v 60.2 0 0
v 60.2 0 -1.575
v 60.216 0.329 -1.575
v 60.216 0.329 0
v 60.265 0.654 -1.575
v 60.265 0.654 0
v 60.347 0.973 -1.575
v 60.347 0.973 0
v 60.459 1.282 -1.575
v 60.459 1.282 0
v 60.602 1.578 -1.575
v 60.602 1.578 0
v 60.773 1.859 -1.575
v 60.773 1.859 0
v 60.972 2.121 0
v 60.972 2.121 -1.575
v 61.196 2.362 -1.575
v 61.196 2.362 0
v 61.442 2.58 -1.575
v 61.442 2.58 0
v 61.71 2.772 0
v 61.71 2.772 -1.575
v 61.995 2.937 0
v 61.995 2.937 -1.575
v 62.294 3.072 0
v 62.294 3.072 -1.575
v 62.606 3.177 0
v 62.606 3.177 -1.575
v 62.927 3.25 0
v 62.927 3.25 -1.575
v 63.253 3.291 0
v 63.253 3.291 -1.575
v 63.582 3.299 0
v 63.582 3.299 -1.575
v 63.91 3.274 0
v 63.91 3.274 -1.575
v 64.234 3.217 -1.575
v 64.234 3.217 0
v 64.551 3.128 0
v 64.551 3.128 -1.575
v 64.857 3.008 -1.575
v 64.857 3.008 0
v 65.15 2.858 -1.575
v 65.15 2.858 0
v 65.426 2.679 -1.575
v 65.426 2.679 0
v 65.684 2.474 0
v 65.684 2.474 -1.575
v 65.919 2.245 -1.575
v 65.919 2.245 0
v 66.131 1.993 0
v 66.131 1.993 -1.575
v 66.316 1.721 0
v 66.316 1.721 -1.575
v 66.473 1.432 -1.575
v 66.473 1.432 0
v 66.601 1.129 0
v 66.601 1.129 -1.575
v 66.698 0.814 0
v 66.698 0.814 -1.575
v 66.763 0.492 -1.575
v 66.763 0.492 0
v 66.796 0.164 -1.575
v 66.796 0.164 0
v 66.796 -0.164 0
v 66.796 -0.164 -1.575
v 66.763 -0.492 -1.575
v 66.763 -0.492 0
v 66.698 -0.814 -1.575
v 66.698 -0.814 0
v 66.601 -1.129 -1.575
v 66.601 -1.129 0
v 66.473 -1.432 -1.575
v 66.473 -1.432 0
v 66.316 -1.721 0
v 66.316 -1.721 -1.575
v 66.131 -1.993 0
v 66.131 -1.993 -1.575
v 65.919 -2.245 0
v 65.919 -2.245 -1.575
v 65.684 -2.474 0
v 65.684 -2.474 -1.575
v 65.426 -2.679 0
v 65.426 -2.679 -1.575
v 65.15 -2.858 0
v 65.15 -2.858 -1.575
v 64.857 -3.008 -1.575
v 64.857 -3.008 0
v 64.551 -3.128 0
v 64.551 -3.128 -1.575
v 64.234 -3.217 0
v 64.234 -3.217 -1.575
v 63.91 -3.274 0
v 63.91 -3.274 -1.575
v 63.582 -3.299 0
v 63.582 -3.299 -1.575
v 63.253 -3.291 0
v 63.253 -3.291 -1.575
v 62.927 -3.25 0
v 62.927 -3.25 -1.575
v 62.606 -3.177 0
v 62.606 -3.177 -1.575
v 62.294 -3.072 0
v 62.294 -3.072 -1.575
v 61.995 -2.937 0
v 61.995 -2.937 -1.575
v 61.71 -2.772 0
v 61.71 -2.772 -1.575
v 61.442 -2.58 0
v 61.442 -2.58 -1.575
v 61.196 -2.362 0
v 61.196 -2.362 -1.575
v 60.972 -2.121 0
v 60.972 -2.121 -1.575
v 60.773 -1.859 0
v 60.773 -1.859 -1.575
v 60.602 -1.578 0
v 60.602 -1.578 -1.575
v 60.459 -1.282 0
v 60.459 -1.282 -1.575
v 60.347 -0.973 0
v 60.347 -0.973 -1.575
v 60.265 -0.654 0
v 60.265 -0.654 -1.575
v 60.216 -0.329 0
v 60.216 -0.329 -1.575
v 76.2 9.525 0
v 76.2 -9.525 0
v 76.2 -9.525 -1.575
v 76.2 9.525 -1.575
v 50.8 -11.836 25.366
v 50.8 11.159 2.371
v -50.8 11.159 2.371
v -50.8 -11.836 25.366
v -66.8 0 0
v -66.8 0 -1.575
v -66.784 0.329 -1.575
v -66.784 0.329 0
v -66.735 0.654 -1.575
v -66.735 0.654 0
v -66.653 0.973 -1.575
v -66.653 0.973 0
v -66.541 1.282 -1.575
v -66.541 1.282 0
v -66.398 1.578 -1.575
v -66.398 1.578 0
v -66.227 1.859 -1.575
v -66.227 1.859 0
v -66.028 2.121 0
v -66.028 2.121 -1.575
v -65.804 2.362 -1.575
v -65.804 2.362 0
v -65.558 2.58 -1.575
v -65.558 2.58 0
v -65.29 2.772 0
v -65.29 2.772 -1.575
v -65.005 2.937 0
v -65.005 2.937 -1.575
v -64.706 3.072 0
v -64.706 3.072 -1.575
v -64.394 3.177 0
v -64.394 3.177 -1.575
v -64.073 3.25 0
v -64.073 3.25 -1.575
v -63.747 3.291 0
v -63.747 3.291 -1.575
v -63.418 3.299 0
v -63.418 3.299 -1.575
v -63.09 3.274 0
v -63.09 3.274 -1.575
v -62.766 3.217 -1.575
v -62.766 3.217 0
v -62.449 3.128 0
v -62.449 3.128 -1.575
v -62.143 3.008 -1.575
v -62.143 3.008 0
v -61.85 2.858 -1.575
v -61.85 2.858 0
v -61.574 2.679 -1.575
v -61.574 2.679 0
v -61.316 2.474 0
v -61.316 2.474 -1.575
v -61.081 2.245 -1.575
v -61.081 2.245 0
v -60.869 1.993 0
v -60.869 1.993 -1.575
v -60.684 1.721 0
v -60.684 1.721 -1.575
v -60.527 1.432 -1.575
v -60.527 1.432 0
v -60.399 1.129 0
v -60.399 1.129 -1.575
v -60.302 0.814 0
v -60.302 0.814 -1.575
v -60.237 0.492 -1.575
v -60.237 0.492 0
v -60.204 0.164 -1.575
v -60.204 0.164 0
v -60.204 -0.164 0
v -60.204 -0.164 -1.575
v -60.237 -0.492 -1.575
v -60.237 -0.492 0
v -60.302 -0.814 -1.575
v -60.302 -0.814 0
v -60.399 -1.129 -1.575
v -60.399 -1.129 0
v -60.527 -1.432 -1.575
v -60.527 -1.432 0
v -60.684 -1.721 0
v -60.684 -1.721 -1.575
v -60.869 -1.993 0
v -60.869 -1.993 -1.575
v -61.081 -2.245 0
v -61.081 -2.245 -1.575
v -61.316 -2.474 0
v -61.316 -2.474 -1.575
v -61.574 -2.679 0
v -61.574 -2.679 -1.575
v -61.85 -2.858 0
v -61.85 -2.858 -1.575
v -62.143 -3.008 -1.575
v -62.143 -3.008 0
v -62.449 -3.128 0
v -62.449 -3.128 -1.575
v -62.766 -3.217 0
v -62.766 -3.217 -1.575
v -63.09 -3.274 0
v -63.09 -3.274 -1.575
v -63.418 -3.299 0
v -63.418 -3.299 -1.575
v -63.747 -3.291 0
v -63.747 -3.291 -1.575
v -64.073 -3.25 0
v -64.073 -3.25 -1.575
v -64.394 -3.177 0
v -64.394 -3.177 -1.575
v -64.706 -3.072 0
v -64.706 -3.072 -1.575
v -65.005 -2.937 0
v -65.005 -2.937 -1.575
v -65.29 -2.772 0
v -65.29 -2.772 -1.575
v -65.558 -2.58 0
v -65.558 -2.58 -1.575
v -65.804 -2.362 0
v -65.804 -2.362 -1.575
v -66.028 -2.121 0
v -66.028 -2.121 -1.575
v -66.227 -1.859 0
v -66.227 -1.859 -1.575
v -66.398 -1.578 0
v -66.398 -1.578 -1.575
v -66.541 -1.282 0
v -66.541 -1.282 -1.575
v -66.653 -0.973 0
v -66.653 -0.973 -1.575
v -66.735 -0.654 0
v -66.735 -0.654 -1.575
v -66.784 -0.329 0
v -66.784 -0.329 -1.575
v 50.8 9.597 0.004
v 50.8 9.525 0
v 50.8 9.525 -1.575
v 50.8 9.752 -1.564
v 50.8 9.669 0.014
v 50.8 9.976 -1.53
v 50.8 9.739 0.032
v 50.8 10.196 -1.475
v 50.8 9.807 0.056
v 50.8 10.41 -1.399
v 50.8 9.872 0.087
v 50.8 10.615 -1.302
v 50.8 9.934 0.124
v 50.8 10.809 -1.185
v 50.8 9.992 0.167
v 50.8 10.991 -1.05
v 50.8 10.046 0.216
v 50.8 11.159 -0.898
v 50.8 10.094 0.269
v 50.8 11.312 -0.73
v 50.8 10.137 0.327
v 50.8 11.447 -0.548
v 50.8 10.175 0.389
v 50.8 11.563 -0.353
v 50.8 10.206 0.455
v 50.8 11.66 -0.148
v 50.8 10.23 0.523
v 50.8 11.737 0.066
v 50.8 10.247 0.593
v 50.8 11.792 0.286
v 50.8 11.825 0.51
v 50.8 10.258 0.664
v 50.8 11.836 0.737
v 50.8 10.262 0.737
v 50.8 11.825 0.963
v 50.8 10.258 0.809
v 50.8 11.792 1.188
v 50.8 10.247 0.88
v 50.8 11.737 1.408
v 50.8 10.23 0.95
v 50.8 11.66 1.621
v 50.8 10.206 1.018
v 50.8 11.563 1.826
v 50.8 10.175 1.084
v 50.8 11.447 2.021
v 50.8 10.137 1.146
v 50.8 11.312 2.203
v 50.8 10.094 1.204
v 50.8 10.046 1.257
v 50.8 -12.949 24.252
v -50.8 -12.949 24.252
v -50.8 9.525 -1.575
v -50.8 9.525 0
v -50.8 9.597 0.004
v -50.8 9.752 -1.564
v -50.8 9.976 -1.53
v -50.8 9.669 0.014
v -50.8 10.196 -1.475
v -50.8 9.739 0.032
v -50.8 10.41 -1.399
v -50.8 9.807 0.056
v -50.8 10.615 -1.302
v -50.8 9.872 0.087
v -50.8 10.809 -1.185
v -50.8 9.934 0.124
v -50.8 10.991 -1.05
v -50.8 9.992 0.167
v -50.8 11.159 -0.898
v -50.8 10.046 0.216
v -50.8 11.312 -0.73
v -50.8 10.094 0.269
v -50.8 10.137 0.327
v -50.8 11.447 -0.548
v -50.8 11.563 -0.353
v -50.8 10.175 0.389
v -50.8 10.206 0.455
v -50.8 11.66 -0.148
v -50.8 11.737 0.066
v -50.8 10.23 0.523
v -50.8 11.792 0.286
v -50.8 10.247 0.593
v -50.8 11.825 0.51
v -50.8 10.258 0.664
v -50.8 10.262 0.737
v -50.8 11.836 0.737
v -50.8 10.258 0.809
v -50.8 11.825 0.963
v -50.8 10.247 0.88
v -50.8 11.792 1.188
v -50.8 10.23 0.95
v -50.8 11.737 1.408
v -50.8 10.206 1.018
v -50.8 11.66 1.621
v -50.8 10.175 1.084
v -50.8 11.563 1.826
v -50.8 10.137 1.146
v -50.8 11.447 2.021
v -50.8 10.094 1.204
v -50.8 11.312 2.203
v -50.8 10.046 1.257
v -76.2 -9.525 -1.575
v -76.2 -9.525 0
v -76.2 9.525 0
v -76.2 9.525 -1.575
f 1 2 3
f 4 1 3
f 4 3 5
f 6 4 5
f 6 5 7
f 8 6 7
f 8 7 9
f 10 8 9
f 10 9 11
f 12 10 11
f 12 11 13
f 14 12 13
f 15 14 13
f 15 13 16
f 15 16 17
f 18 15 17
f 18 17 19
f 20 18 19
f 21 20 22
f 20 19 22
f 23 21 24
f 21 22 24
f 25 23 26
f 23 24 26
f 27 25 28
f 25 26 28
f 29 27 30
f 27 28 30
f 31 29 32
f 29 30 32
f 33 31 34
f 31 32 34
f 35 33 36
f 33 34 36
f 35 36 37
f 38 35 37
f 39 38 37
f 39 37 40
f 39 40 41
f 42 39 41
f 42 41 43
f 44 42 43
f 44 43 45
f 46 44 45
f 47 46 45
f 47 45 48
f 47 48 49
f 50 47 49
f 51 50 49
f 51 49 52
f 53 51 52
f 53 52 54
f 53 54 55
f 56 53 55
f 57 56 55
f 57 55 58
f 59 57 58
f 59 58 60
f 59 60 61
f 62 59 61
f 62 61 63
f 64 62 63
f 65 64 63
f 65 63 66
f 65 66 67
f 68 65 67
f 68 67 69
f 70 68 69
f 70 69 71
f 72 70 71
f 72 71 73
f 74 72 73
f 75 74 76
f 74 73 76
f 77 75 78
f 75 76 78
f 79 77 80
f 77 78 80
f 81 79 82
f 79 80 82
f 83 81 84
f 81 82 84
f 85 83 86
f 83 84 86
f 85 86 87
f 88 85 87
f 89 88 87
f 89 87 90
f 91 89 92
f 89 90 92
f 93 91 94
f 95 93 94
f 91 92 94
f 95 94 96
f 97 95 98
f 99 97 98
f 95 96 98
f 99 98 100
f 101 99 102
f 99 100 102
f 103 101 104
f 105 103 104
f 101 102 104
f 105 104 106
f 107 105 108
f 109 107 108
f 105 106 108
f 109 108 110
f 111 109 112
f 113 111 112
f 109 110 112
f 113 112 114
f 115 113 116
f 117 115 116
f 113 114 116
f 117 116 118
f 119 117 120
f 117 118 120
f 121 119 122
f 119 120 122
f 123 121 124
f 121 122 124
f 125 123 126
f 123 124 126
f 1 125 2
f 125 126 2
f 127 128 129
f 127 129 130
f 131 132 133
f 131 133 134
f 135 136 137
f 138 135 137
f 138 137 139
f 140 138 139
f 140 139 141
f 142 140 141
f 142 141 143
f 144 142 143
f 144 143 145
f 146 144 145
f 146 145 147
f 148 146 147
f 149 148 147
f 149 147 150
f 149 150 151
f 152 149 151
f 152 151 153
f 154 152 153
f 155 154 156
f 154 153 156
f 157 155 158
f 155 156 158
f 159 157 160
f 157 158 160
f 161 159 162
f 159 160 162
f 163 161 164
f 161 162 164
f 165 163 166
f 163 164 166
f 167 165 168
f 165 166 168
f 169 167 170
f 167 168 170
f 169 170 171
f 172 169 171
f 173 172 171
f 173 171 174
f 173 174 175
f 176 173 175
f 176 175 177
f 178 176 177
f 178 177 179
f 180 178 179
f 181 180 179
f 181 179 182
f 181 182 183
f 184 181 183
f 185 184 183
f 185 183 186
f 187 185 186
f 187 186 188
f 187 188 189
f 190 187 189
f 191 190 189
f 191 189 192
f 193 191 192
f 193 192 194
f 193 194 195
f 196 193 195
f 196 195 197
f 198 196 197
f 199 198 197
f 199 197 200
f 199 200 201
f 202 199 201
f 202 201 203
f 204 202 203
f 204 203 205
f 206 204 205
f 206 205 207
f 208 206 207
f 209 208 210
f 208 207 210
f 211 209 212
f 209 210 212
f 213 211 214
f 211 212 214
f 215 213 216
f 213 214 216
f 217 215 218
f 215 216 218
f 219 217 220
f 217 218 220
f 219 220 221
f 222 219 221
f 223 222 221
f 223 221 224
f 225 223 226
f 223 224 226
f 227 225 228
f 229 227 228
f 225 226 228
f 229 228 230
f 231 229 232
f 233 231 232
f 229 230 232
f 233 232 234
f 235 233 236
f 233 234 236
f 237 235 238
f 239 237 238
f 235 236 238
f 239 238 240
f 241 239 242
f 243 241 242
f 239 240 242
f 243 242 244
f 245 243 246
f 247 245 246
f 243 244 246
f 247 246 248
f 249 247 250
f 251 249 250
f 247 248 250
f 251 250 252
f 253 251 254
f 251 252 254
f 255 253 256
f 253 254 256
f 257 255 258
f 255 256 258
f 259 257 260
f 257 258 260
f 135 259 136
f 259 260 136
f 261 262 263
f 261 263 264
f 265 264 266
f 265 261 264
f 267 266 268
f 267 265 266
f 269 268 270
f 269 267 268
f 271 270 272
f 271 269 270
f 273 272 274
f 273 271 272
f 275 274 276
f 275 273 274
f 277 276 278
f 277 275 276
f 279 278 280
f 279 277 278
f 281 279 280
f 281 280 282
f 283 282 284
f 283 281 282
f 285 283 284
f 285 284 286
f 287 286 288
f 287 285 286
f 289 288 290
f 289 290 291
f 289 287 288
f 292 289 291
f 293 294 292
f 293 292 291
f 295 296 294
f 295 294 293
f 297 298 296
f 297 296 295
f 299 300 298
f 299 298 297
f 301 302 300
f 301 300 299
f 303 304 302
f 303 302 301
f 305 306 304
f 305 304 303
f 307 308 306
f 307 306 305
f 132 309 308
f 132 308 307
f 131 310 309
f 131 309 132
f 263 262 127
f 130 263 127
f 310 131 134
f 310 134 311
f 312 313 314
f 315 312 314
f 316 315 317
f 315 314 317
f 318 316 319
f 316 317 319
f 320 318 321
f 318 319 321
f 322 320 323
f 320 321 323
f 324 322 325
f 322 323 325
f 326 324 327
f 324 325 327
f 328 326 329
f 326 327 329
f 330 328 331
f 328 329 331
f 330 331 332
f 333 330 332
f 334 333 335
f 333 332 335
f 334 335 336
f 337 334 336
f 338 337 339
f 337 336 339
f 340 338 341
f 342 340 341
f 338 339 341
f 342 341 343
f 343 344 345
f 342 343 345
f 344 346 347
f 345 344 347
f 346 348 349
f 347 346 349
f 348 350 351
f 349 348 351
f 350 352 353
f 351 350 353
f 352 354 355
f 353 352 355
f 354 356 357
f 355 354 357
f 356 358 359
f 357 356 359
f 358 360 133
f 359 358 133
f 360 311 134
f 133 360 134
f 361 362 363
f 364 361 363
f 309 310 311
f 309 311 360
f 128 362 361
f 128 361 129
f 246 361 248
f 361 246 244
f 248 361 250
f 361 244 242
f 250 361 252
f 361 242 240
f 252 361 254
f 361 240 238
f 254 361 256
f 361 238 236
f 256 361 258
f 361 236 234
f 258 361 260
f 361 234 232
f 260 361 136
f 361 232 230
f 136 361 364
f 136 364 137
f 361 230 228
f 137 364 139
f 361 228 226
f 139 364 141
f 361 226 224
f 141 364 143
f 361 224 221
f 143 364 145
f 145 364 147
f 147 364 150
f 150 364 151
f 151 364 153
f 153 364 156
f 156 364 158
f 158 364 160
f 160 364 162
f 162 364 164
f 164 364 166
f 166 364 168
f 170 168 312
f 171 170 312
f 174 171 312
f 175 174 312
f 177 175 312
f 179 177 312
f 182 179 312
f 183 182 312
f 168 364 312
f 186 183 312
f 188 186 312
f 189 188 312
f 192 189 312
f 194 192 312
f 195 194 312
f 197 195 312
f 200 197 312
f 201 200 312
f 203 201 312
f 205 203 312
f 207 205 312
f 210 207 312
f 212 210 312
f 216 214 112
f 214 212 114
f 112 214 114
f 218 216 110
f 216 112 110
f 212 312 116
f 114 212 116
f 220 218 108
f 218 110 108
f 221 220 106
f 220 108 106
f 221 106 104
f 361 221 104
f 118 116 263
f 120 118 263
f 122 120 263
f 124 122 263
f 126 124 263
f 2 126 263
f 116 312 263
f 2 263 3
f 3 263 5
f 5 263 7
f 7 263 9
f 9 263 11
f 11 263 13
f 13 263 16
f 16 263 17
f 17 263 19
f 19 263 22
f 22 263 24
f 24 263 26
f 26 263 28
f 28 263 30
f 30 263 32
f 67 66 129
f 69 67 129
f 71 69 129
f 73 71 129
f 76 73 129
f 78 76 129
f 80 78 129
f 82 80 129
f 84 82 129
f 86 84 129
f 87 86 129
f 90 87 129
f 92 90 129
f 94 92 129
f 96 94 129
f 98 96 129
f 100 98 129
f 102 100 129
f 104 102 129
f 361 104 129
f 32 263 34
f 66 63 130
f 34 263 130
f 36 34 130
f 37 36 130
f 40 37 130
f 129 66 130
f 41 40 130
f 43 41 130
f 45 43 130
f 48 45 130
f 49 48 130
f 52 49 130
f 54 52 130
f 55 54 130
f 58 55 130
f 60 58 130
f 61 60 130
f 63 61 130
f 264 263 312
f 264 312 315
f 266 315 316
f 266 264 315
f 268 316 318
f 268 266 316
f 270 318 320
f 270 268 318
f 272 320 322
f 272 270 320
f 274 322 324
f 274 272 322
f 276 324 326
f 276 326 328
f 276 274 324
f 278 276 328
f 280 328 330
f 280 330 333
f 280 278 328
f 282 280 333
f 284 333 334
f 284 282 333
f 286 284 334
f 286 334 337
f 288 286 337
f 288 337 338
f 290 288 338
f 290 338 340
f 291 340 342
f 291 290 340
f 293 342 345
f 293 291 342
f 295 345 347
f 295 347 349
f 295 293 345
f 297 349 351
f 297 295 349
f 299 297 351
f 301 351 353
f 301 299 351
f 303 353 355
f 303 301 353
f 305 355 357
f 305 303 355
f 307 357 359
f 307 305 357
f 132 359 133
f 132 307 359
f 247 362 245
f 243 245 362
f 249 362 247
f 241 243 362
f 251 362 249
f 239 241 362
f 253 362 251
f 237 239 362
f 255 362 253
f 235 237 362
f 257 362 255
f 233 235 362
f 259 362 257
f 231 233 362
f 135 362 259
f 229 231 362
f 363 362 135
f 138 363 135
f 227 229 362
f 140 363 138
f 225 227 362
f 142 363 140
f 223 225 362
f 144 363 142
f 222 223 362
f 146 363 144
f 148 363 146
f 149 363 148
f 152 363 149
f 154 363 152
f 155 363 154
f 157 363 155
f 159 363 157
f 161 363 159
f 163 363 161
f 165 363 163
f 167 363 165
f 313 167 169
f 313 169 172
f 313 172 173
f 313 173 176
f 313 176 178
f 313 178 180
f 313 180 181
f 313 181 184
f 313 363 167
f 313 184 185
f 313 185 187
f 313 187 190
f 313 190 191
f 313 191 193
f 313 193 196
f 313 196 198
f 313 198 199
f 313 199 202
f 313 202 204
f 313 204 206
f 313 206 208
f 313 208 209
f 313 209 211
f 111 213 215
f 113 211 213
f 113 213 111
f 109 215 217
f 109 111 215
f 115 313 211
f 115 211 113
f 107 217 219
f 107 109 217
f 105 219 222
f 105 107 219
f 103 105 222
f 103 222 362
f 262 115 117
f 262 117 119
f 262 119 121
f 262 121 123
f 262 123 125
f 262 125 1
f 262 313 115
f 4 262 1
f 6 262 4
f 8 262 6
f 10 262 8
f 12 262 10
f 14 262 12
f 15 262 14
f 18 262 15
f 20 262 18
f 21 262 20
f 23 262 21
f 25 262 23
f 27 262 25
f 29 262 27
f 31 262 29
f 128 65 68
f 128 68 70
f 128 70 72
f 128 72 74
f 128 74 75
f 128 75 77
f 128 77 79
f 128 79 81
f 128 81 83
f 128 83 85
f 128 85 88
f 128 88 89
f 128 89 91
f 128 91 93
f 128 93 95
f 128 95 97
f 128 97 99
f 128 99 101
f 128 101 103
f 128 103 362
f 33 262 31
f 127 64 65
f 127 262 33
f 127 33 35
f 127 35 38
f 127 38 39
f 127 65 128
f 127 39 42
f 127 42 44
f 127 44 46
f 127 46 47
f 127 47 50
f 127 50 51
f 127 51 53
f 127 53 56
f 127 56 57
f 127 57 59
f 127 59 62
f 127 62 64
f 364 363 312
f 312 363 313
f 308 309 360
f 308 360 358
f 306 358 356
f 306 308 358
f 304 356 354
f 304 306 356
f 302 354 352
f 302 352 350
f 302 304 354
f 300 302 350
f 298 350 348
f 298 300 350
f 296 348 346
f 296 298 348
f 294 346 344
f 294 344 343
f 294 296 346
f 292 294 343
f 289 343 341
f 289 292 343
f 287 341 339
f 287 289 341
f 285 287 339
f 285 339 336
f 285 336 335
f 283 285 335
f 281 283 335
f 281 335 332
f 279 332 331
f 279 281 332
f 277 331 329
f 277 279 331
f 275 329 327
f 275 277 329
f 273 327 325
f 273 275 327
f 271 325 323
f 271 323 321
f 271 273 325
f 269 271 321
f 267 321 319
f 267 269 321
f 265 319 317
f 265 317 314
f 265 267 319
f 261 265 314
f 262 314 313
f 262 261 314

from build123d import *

# Parameters (mm, degrees)
SKETCH3_W            = 152.4
SKETCH3_H            = 19.05
BASE_FLANGE1_DEPTH   = 1.5748
EDGE_FLANGE1_DEPTH   = 101.6
M6_CLEARANCE_HOLE1_D = 6.6


# Sheet-metal steps are written as plain solids
with BuildPart() as part:
    # Sketch3 → Base-Flange1 (new body)
    with BuildSketch(Plane.XY):
        Rectangle(SKETCH3_W, SKETCH3_H)
    extrude(amount=-BASE_FLANGE1_DEPTH)

    # Edge-Flange1 section (across the edge) → Edge-Flange1 (add)
    with BuildSketch(Plane(origin=(50.8, 11.30330971, 0), x_dir=(0, -0.7071067811865488, -0.7071067811865464), z_dir=(-1, 0, 0))):
        with BuildLine():
            Line((-1.5748, 1.77830971), (-1.5748, 34.298096482))
            Line((-1.5748, 34.298096482), (0, 34.298096482))
            Line((0, 34.298096482), (0, 1.77830971))
            ThreePointArc((0, 1.77830971), (0.454715384, 1.097780046), (1.257454855, 1.257454855))
            Line((1.257454855, 1.257454855), (2.371006614, 0.143903096))
            ThreePointArc((2.371006614, 0.143903096), (-0.147934486, -0.357145441), (-1.5748, 1.77830971))
        make_face()
    extrude(amount=EDGE_FLANGE1_DEPTH)

    # M6 Clearance Hole1 (through all)
    with Locations(Plane.XY):
        with Locations((-63.5, 0), (63.5, 0)):
            Hole(M6_CLEARANCE_HOLE1_D / 2)


solid = part.part
